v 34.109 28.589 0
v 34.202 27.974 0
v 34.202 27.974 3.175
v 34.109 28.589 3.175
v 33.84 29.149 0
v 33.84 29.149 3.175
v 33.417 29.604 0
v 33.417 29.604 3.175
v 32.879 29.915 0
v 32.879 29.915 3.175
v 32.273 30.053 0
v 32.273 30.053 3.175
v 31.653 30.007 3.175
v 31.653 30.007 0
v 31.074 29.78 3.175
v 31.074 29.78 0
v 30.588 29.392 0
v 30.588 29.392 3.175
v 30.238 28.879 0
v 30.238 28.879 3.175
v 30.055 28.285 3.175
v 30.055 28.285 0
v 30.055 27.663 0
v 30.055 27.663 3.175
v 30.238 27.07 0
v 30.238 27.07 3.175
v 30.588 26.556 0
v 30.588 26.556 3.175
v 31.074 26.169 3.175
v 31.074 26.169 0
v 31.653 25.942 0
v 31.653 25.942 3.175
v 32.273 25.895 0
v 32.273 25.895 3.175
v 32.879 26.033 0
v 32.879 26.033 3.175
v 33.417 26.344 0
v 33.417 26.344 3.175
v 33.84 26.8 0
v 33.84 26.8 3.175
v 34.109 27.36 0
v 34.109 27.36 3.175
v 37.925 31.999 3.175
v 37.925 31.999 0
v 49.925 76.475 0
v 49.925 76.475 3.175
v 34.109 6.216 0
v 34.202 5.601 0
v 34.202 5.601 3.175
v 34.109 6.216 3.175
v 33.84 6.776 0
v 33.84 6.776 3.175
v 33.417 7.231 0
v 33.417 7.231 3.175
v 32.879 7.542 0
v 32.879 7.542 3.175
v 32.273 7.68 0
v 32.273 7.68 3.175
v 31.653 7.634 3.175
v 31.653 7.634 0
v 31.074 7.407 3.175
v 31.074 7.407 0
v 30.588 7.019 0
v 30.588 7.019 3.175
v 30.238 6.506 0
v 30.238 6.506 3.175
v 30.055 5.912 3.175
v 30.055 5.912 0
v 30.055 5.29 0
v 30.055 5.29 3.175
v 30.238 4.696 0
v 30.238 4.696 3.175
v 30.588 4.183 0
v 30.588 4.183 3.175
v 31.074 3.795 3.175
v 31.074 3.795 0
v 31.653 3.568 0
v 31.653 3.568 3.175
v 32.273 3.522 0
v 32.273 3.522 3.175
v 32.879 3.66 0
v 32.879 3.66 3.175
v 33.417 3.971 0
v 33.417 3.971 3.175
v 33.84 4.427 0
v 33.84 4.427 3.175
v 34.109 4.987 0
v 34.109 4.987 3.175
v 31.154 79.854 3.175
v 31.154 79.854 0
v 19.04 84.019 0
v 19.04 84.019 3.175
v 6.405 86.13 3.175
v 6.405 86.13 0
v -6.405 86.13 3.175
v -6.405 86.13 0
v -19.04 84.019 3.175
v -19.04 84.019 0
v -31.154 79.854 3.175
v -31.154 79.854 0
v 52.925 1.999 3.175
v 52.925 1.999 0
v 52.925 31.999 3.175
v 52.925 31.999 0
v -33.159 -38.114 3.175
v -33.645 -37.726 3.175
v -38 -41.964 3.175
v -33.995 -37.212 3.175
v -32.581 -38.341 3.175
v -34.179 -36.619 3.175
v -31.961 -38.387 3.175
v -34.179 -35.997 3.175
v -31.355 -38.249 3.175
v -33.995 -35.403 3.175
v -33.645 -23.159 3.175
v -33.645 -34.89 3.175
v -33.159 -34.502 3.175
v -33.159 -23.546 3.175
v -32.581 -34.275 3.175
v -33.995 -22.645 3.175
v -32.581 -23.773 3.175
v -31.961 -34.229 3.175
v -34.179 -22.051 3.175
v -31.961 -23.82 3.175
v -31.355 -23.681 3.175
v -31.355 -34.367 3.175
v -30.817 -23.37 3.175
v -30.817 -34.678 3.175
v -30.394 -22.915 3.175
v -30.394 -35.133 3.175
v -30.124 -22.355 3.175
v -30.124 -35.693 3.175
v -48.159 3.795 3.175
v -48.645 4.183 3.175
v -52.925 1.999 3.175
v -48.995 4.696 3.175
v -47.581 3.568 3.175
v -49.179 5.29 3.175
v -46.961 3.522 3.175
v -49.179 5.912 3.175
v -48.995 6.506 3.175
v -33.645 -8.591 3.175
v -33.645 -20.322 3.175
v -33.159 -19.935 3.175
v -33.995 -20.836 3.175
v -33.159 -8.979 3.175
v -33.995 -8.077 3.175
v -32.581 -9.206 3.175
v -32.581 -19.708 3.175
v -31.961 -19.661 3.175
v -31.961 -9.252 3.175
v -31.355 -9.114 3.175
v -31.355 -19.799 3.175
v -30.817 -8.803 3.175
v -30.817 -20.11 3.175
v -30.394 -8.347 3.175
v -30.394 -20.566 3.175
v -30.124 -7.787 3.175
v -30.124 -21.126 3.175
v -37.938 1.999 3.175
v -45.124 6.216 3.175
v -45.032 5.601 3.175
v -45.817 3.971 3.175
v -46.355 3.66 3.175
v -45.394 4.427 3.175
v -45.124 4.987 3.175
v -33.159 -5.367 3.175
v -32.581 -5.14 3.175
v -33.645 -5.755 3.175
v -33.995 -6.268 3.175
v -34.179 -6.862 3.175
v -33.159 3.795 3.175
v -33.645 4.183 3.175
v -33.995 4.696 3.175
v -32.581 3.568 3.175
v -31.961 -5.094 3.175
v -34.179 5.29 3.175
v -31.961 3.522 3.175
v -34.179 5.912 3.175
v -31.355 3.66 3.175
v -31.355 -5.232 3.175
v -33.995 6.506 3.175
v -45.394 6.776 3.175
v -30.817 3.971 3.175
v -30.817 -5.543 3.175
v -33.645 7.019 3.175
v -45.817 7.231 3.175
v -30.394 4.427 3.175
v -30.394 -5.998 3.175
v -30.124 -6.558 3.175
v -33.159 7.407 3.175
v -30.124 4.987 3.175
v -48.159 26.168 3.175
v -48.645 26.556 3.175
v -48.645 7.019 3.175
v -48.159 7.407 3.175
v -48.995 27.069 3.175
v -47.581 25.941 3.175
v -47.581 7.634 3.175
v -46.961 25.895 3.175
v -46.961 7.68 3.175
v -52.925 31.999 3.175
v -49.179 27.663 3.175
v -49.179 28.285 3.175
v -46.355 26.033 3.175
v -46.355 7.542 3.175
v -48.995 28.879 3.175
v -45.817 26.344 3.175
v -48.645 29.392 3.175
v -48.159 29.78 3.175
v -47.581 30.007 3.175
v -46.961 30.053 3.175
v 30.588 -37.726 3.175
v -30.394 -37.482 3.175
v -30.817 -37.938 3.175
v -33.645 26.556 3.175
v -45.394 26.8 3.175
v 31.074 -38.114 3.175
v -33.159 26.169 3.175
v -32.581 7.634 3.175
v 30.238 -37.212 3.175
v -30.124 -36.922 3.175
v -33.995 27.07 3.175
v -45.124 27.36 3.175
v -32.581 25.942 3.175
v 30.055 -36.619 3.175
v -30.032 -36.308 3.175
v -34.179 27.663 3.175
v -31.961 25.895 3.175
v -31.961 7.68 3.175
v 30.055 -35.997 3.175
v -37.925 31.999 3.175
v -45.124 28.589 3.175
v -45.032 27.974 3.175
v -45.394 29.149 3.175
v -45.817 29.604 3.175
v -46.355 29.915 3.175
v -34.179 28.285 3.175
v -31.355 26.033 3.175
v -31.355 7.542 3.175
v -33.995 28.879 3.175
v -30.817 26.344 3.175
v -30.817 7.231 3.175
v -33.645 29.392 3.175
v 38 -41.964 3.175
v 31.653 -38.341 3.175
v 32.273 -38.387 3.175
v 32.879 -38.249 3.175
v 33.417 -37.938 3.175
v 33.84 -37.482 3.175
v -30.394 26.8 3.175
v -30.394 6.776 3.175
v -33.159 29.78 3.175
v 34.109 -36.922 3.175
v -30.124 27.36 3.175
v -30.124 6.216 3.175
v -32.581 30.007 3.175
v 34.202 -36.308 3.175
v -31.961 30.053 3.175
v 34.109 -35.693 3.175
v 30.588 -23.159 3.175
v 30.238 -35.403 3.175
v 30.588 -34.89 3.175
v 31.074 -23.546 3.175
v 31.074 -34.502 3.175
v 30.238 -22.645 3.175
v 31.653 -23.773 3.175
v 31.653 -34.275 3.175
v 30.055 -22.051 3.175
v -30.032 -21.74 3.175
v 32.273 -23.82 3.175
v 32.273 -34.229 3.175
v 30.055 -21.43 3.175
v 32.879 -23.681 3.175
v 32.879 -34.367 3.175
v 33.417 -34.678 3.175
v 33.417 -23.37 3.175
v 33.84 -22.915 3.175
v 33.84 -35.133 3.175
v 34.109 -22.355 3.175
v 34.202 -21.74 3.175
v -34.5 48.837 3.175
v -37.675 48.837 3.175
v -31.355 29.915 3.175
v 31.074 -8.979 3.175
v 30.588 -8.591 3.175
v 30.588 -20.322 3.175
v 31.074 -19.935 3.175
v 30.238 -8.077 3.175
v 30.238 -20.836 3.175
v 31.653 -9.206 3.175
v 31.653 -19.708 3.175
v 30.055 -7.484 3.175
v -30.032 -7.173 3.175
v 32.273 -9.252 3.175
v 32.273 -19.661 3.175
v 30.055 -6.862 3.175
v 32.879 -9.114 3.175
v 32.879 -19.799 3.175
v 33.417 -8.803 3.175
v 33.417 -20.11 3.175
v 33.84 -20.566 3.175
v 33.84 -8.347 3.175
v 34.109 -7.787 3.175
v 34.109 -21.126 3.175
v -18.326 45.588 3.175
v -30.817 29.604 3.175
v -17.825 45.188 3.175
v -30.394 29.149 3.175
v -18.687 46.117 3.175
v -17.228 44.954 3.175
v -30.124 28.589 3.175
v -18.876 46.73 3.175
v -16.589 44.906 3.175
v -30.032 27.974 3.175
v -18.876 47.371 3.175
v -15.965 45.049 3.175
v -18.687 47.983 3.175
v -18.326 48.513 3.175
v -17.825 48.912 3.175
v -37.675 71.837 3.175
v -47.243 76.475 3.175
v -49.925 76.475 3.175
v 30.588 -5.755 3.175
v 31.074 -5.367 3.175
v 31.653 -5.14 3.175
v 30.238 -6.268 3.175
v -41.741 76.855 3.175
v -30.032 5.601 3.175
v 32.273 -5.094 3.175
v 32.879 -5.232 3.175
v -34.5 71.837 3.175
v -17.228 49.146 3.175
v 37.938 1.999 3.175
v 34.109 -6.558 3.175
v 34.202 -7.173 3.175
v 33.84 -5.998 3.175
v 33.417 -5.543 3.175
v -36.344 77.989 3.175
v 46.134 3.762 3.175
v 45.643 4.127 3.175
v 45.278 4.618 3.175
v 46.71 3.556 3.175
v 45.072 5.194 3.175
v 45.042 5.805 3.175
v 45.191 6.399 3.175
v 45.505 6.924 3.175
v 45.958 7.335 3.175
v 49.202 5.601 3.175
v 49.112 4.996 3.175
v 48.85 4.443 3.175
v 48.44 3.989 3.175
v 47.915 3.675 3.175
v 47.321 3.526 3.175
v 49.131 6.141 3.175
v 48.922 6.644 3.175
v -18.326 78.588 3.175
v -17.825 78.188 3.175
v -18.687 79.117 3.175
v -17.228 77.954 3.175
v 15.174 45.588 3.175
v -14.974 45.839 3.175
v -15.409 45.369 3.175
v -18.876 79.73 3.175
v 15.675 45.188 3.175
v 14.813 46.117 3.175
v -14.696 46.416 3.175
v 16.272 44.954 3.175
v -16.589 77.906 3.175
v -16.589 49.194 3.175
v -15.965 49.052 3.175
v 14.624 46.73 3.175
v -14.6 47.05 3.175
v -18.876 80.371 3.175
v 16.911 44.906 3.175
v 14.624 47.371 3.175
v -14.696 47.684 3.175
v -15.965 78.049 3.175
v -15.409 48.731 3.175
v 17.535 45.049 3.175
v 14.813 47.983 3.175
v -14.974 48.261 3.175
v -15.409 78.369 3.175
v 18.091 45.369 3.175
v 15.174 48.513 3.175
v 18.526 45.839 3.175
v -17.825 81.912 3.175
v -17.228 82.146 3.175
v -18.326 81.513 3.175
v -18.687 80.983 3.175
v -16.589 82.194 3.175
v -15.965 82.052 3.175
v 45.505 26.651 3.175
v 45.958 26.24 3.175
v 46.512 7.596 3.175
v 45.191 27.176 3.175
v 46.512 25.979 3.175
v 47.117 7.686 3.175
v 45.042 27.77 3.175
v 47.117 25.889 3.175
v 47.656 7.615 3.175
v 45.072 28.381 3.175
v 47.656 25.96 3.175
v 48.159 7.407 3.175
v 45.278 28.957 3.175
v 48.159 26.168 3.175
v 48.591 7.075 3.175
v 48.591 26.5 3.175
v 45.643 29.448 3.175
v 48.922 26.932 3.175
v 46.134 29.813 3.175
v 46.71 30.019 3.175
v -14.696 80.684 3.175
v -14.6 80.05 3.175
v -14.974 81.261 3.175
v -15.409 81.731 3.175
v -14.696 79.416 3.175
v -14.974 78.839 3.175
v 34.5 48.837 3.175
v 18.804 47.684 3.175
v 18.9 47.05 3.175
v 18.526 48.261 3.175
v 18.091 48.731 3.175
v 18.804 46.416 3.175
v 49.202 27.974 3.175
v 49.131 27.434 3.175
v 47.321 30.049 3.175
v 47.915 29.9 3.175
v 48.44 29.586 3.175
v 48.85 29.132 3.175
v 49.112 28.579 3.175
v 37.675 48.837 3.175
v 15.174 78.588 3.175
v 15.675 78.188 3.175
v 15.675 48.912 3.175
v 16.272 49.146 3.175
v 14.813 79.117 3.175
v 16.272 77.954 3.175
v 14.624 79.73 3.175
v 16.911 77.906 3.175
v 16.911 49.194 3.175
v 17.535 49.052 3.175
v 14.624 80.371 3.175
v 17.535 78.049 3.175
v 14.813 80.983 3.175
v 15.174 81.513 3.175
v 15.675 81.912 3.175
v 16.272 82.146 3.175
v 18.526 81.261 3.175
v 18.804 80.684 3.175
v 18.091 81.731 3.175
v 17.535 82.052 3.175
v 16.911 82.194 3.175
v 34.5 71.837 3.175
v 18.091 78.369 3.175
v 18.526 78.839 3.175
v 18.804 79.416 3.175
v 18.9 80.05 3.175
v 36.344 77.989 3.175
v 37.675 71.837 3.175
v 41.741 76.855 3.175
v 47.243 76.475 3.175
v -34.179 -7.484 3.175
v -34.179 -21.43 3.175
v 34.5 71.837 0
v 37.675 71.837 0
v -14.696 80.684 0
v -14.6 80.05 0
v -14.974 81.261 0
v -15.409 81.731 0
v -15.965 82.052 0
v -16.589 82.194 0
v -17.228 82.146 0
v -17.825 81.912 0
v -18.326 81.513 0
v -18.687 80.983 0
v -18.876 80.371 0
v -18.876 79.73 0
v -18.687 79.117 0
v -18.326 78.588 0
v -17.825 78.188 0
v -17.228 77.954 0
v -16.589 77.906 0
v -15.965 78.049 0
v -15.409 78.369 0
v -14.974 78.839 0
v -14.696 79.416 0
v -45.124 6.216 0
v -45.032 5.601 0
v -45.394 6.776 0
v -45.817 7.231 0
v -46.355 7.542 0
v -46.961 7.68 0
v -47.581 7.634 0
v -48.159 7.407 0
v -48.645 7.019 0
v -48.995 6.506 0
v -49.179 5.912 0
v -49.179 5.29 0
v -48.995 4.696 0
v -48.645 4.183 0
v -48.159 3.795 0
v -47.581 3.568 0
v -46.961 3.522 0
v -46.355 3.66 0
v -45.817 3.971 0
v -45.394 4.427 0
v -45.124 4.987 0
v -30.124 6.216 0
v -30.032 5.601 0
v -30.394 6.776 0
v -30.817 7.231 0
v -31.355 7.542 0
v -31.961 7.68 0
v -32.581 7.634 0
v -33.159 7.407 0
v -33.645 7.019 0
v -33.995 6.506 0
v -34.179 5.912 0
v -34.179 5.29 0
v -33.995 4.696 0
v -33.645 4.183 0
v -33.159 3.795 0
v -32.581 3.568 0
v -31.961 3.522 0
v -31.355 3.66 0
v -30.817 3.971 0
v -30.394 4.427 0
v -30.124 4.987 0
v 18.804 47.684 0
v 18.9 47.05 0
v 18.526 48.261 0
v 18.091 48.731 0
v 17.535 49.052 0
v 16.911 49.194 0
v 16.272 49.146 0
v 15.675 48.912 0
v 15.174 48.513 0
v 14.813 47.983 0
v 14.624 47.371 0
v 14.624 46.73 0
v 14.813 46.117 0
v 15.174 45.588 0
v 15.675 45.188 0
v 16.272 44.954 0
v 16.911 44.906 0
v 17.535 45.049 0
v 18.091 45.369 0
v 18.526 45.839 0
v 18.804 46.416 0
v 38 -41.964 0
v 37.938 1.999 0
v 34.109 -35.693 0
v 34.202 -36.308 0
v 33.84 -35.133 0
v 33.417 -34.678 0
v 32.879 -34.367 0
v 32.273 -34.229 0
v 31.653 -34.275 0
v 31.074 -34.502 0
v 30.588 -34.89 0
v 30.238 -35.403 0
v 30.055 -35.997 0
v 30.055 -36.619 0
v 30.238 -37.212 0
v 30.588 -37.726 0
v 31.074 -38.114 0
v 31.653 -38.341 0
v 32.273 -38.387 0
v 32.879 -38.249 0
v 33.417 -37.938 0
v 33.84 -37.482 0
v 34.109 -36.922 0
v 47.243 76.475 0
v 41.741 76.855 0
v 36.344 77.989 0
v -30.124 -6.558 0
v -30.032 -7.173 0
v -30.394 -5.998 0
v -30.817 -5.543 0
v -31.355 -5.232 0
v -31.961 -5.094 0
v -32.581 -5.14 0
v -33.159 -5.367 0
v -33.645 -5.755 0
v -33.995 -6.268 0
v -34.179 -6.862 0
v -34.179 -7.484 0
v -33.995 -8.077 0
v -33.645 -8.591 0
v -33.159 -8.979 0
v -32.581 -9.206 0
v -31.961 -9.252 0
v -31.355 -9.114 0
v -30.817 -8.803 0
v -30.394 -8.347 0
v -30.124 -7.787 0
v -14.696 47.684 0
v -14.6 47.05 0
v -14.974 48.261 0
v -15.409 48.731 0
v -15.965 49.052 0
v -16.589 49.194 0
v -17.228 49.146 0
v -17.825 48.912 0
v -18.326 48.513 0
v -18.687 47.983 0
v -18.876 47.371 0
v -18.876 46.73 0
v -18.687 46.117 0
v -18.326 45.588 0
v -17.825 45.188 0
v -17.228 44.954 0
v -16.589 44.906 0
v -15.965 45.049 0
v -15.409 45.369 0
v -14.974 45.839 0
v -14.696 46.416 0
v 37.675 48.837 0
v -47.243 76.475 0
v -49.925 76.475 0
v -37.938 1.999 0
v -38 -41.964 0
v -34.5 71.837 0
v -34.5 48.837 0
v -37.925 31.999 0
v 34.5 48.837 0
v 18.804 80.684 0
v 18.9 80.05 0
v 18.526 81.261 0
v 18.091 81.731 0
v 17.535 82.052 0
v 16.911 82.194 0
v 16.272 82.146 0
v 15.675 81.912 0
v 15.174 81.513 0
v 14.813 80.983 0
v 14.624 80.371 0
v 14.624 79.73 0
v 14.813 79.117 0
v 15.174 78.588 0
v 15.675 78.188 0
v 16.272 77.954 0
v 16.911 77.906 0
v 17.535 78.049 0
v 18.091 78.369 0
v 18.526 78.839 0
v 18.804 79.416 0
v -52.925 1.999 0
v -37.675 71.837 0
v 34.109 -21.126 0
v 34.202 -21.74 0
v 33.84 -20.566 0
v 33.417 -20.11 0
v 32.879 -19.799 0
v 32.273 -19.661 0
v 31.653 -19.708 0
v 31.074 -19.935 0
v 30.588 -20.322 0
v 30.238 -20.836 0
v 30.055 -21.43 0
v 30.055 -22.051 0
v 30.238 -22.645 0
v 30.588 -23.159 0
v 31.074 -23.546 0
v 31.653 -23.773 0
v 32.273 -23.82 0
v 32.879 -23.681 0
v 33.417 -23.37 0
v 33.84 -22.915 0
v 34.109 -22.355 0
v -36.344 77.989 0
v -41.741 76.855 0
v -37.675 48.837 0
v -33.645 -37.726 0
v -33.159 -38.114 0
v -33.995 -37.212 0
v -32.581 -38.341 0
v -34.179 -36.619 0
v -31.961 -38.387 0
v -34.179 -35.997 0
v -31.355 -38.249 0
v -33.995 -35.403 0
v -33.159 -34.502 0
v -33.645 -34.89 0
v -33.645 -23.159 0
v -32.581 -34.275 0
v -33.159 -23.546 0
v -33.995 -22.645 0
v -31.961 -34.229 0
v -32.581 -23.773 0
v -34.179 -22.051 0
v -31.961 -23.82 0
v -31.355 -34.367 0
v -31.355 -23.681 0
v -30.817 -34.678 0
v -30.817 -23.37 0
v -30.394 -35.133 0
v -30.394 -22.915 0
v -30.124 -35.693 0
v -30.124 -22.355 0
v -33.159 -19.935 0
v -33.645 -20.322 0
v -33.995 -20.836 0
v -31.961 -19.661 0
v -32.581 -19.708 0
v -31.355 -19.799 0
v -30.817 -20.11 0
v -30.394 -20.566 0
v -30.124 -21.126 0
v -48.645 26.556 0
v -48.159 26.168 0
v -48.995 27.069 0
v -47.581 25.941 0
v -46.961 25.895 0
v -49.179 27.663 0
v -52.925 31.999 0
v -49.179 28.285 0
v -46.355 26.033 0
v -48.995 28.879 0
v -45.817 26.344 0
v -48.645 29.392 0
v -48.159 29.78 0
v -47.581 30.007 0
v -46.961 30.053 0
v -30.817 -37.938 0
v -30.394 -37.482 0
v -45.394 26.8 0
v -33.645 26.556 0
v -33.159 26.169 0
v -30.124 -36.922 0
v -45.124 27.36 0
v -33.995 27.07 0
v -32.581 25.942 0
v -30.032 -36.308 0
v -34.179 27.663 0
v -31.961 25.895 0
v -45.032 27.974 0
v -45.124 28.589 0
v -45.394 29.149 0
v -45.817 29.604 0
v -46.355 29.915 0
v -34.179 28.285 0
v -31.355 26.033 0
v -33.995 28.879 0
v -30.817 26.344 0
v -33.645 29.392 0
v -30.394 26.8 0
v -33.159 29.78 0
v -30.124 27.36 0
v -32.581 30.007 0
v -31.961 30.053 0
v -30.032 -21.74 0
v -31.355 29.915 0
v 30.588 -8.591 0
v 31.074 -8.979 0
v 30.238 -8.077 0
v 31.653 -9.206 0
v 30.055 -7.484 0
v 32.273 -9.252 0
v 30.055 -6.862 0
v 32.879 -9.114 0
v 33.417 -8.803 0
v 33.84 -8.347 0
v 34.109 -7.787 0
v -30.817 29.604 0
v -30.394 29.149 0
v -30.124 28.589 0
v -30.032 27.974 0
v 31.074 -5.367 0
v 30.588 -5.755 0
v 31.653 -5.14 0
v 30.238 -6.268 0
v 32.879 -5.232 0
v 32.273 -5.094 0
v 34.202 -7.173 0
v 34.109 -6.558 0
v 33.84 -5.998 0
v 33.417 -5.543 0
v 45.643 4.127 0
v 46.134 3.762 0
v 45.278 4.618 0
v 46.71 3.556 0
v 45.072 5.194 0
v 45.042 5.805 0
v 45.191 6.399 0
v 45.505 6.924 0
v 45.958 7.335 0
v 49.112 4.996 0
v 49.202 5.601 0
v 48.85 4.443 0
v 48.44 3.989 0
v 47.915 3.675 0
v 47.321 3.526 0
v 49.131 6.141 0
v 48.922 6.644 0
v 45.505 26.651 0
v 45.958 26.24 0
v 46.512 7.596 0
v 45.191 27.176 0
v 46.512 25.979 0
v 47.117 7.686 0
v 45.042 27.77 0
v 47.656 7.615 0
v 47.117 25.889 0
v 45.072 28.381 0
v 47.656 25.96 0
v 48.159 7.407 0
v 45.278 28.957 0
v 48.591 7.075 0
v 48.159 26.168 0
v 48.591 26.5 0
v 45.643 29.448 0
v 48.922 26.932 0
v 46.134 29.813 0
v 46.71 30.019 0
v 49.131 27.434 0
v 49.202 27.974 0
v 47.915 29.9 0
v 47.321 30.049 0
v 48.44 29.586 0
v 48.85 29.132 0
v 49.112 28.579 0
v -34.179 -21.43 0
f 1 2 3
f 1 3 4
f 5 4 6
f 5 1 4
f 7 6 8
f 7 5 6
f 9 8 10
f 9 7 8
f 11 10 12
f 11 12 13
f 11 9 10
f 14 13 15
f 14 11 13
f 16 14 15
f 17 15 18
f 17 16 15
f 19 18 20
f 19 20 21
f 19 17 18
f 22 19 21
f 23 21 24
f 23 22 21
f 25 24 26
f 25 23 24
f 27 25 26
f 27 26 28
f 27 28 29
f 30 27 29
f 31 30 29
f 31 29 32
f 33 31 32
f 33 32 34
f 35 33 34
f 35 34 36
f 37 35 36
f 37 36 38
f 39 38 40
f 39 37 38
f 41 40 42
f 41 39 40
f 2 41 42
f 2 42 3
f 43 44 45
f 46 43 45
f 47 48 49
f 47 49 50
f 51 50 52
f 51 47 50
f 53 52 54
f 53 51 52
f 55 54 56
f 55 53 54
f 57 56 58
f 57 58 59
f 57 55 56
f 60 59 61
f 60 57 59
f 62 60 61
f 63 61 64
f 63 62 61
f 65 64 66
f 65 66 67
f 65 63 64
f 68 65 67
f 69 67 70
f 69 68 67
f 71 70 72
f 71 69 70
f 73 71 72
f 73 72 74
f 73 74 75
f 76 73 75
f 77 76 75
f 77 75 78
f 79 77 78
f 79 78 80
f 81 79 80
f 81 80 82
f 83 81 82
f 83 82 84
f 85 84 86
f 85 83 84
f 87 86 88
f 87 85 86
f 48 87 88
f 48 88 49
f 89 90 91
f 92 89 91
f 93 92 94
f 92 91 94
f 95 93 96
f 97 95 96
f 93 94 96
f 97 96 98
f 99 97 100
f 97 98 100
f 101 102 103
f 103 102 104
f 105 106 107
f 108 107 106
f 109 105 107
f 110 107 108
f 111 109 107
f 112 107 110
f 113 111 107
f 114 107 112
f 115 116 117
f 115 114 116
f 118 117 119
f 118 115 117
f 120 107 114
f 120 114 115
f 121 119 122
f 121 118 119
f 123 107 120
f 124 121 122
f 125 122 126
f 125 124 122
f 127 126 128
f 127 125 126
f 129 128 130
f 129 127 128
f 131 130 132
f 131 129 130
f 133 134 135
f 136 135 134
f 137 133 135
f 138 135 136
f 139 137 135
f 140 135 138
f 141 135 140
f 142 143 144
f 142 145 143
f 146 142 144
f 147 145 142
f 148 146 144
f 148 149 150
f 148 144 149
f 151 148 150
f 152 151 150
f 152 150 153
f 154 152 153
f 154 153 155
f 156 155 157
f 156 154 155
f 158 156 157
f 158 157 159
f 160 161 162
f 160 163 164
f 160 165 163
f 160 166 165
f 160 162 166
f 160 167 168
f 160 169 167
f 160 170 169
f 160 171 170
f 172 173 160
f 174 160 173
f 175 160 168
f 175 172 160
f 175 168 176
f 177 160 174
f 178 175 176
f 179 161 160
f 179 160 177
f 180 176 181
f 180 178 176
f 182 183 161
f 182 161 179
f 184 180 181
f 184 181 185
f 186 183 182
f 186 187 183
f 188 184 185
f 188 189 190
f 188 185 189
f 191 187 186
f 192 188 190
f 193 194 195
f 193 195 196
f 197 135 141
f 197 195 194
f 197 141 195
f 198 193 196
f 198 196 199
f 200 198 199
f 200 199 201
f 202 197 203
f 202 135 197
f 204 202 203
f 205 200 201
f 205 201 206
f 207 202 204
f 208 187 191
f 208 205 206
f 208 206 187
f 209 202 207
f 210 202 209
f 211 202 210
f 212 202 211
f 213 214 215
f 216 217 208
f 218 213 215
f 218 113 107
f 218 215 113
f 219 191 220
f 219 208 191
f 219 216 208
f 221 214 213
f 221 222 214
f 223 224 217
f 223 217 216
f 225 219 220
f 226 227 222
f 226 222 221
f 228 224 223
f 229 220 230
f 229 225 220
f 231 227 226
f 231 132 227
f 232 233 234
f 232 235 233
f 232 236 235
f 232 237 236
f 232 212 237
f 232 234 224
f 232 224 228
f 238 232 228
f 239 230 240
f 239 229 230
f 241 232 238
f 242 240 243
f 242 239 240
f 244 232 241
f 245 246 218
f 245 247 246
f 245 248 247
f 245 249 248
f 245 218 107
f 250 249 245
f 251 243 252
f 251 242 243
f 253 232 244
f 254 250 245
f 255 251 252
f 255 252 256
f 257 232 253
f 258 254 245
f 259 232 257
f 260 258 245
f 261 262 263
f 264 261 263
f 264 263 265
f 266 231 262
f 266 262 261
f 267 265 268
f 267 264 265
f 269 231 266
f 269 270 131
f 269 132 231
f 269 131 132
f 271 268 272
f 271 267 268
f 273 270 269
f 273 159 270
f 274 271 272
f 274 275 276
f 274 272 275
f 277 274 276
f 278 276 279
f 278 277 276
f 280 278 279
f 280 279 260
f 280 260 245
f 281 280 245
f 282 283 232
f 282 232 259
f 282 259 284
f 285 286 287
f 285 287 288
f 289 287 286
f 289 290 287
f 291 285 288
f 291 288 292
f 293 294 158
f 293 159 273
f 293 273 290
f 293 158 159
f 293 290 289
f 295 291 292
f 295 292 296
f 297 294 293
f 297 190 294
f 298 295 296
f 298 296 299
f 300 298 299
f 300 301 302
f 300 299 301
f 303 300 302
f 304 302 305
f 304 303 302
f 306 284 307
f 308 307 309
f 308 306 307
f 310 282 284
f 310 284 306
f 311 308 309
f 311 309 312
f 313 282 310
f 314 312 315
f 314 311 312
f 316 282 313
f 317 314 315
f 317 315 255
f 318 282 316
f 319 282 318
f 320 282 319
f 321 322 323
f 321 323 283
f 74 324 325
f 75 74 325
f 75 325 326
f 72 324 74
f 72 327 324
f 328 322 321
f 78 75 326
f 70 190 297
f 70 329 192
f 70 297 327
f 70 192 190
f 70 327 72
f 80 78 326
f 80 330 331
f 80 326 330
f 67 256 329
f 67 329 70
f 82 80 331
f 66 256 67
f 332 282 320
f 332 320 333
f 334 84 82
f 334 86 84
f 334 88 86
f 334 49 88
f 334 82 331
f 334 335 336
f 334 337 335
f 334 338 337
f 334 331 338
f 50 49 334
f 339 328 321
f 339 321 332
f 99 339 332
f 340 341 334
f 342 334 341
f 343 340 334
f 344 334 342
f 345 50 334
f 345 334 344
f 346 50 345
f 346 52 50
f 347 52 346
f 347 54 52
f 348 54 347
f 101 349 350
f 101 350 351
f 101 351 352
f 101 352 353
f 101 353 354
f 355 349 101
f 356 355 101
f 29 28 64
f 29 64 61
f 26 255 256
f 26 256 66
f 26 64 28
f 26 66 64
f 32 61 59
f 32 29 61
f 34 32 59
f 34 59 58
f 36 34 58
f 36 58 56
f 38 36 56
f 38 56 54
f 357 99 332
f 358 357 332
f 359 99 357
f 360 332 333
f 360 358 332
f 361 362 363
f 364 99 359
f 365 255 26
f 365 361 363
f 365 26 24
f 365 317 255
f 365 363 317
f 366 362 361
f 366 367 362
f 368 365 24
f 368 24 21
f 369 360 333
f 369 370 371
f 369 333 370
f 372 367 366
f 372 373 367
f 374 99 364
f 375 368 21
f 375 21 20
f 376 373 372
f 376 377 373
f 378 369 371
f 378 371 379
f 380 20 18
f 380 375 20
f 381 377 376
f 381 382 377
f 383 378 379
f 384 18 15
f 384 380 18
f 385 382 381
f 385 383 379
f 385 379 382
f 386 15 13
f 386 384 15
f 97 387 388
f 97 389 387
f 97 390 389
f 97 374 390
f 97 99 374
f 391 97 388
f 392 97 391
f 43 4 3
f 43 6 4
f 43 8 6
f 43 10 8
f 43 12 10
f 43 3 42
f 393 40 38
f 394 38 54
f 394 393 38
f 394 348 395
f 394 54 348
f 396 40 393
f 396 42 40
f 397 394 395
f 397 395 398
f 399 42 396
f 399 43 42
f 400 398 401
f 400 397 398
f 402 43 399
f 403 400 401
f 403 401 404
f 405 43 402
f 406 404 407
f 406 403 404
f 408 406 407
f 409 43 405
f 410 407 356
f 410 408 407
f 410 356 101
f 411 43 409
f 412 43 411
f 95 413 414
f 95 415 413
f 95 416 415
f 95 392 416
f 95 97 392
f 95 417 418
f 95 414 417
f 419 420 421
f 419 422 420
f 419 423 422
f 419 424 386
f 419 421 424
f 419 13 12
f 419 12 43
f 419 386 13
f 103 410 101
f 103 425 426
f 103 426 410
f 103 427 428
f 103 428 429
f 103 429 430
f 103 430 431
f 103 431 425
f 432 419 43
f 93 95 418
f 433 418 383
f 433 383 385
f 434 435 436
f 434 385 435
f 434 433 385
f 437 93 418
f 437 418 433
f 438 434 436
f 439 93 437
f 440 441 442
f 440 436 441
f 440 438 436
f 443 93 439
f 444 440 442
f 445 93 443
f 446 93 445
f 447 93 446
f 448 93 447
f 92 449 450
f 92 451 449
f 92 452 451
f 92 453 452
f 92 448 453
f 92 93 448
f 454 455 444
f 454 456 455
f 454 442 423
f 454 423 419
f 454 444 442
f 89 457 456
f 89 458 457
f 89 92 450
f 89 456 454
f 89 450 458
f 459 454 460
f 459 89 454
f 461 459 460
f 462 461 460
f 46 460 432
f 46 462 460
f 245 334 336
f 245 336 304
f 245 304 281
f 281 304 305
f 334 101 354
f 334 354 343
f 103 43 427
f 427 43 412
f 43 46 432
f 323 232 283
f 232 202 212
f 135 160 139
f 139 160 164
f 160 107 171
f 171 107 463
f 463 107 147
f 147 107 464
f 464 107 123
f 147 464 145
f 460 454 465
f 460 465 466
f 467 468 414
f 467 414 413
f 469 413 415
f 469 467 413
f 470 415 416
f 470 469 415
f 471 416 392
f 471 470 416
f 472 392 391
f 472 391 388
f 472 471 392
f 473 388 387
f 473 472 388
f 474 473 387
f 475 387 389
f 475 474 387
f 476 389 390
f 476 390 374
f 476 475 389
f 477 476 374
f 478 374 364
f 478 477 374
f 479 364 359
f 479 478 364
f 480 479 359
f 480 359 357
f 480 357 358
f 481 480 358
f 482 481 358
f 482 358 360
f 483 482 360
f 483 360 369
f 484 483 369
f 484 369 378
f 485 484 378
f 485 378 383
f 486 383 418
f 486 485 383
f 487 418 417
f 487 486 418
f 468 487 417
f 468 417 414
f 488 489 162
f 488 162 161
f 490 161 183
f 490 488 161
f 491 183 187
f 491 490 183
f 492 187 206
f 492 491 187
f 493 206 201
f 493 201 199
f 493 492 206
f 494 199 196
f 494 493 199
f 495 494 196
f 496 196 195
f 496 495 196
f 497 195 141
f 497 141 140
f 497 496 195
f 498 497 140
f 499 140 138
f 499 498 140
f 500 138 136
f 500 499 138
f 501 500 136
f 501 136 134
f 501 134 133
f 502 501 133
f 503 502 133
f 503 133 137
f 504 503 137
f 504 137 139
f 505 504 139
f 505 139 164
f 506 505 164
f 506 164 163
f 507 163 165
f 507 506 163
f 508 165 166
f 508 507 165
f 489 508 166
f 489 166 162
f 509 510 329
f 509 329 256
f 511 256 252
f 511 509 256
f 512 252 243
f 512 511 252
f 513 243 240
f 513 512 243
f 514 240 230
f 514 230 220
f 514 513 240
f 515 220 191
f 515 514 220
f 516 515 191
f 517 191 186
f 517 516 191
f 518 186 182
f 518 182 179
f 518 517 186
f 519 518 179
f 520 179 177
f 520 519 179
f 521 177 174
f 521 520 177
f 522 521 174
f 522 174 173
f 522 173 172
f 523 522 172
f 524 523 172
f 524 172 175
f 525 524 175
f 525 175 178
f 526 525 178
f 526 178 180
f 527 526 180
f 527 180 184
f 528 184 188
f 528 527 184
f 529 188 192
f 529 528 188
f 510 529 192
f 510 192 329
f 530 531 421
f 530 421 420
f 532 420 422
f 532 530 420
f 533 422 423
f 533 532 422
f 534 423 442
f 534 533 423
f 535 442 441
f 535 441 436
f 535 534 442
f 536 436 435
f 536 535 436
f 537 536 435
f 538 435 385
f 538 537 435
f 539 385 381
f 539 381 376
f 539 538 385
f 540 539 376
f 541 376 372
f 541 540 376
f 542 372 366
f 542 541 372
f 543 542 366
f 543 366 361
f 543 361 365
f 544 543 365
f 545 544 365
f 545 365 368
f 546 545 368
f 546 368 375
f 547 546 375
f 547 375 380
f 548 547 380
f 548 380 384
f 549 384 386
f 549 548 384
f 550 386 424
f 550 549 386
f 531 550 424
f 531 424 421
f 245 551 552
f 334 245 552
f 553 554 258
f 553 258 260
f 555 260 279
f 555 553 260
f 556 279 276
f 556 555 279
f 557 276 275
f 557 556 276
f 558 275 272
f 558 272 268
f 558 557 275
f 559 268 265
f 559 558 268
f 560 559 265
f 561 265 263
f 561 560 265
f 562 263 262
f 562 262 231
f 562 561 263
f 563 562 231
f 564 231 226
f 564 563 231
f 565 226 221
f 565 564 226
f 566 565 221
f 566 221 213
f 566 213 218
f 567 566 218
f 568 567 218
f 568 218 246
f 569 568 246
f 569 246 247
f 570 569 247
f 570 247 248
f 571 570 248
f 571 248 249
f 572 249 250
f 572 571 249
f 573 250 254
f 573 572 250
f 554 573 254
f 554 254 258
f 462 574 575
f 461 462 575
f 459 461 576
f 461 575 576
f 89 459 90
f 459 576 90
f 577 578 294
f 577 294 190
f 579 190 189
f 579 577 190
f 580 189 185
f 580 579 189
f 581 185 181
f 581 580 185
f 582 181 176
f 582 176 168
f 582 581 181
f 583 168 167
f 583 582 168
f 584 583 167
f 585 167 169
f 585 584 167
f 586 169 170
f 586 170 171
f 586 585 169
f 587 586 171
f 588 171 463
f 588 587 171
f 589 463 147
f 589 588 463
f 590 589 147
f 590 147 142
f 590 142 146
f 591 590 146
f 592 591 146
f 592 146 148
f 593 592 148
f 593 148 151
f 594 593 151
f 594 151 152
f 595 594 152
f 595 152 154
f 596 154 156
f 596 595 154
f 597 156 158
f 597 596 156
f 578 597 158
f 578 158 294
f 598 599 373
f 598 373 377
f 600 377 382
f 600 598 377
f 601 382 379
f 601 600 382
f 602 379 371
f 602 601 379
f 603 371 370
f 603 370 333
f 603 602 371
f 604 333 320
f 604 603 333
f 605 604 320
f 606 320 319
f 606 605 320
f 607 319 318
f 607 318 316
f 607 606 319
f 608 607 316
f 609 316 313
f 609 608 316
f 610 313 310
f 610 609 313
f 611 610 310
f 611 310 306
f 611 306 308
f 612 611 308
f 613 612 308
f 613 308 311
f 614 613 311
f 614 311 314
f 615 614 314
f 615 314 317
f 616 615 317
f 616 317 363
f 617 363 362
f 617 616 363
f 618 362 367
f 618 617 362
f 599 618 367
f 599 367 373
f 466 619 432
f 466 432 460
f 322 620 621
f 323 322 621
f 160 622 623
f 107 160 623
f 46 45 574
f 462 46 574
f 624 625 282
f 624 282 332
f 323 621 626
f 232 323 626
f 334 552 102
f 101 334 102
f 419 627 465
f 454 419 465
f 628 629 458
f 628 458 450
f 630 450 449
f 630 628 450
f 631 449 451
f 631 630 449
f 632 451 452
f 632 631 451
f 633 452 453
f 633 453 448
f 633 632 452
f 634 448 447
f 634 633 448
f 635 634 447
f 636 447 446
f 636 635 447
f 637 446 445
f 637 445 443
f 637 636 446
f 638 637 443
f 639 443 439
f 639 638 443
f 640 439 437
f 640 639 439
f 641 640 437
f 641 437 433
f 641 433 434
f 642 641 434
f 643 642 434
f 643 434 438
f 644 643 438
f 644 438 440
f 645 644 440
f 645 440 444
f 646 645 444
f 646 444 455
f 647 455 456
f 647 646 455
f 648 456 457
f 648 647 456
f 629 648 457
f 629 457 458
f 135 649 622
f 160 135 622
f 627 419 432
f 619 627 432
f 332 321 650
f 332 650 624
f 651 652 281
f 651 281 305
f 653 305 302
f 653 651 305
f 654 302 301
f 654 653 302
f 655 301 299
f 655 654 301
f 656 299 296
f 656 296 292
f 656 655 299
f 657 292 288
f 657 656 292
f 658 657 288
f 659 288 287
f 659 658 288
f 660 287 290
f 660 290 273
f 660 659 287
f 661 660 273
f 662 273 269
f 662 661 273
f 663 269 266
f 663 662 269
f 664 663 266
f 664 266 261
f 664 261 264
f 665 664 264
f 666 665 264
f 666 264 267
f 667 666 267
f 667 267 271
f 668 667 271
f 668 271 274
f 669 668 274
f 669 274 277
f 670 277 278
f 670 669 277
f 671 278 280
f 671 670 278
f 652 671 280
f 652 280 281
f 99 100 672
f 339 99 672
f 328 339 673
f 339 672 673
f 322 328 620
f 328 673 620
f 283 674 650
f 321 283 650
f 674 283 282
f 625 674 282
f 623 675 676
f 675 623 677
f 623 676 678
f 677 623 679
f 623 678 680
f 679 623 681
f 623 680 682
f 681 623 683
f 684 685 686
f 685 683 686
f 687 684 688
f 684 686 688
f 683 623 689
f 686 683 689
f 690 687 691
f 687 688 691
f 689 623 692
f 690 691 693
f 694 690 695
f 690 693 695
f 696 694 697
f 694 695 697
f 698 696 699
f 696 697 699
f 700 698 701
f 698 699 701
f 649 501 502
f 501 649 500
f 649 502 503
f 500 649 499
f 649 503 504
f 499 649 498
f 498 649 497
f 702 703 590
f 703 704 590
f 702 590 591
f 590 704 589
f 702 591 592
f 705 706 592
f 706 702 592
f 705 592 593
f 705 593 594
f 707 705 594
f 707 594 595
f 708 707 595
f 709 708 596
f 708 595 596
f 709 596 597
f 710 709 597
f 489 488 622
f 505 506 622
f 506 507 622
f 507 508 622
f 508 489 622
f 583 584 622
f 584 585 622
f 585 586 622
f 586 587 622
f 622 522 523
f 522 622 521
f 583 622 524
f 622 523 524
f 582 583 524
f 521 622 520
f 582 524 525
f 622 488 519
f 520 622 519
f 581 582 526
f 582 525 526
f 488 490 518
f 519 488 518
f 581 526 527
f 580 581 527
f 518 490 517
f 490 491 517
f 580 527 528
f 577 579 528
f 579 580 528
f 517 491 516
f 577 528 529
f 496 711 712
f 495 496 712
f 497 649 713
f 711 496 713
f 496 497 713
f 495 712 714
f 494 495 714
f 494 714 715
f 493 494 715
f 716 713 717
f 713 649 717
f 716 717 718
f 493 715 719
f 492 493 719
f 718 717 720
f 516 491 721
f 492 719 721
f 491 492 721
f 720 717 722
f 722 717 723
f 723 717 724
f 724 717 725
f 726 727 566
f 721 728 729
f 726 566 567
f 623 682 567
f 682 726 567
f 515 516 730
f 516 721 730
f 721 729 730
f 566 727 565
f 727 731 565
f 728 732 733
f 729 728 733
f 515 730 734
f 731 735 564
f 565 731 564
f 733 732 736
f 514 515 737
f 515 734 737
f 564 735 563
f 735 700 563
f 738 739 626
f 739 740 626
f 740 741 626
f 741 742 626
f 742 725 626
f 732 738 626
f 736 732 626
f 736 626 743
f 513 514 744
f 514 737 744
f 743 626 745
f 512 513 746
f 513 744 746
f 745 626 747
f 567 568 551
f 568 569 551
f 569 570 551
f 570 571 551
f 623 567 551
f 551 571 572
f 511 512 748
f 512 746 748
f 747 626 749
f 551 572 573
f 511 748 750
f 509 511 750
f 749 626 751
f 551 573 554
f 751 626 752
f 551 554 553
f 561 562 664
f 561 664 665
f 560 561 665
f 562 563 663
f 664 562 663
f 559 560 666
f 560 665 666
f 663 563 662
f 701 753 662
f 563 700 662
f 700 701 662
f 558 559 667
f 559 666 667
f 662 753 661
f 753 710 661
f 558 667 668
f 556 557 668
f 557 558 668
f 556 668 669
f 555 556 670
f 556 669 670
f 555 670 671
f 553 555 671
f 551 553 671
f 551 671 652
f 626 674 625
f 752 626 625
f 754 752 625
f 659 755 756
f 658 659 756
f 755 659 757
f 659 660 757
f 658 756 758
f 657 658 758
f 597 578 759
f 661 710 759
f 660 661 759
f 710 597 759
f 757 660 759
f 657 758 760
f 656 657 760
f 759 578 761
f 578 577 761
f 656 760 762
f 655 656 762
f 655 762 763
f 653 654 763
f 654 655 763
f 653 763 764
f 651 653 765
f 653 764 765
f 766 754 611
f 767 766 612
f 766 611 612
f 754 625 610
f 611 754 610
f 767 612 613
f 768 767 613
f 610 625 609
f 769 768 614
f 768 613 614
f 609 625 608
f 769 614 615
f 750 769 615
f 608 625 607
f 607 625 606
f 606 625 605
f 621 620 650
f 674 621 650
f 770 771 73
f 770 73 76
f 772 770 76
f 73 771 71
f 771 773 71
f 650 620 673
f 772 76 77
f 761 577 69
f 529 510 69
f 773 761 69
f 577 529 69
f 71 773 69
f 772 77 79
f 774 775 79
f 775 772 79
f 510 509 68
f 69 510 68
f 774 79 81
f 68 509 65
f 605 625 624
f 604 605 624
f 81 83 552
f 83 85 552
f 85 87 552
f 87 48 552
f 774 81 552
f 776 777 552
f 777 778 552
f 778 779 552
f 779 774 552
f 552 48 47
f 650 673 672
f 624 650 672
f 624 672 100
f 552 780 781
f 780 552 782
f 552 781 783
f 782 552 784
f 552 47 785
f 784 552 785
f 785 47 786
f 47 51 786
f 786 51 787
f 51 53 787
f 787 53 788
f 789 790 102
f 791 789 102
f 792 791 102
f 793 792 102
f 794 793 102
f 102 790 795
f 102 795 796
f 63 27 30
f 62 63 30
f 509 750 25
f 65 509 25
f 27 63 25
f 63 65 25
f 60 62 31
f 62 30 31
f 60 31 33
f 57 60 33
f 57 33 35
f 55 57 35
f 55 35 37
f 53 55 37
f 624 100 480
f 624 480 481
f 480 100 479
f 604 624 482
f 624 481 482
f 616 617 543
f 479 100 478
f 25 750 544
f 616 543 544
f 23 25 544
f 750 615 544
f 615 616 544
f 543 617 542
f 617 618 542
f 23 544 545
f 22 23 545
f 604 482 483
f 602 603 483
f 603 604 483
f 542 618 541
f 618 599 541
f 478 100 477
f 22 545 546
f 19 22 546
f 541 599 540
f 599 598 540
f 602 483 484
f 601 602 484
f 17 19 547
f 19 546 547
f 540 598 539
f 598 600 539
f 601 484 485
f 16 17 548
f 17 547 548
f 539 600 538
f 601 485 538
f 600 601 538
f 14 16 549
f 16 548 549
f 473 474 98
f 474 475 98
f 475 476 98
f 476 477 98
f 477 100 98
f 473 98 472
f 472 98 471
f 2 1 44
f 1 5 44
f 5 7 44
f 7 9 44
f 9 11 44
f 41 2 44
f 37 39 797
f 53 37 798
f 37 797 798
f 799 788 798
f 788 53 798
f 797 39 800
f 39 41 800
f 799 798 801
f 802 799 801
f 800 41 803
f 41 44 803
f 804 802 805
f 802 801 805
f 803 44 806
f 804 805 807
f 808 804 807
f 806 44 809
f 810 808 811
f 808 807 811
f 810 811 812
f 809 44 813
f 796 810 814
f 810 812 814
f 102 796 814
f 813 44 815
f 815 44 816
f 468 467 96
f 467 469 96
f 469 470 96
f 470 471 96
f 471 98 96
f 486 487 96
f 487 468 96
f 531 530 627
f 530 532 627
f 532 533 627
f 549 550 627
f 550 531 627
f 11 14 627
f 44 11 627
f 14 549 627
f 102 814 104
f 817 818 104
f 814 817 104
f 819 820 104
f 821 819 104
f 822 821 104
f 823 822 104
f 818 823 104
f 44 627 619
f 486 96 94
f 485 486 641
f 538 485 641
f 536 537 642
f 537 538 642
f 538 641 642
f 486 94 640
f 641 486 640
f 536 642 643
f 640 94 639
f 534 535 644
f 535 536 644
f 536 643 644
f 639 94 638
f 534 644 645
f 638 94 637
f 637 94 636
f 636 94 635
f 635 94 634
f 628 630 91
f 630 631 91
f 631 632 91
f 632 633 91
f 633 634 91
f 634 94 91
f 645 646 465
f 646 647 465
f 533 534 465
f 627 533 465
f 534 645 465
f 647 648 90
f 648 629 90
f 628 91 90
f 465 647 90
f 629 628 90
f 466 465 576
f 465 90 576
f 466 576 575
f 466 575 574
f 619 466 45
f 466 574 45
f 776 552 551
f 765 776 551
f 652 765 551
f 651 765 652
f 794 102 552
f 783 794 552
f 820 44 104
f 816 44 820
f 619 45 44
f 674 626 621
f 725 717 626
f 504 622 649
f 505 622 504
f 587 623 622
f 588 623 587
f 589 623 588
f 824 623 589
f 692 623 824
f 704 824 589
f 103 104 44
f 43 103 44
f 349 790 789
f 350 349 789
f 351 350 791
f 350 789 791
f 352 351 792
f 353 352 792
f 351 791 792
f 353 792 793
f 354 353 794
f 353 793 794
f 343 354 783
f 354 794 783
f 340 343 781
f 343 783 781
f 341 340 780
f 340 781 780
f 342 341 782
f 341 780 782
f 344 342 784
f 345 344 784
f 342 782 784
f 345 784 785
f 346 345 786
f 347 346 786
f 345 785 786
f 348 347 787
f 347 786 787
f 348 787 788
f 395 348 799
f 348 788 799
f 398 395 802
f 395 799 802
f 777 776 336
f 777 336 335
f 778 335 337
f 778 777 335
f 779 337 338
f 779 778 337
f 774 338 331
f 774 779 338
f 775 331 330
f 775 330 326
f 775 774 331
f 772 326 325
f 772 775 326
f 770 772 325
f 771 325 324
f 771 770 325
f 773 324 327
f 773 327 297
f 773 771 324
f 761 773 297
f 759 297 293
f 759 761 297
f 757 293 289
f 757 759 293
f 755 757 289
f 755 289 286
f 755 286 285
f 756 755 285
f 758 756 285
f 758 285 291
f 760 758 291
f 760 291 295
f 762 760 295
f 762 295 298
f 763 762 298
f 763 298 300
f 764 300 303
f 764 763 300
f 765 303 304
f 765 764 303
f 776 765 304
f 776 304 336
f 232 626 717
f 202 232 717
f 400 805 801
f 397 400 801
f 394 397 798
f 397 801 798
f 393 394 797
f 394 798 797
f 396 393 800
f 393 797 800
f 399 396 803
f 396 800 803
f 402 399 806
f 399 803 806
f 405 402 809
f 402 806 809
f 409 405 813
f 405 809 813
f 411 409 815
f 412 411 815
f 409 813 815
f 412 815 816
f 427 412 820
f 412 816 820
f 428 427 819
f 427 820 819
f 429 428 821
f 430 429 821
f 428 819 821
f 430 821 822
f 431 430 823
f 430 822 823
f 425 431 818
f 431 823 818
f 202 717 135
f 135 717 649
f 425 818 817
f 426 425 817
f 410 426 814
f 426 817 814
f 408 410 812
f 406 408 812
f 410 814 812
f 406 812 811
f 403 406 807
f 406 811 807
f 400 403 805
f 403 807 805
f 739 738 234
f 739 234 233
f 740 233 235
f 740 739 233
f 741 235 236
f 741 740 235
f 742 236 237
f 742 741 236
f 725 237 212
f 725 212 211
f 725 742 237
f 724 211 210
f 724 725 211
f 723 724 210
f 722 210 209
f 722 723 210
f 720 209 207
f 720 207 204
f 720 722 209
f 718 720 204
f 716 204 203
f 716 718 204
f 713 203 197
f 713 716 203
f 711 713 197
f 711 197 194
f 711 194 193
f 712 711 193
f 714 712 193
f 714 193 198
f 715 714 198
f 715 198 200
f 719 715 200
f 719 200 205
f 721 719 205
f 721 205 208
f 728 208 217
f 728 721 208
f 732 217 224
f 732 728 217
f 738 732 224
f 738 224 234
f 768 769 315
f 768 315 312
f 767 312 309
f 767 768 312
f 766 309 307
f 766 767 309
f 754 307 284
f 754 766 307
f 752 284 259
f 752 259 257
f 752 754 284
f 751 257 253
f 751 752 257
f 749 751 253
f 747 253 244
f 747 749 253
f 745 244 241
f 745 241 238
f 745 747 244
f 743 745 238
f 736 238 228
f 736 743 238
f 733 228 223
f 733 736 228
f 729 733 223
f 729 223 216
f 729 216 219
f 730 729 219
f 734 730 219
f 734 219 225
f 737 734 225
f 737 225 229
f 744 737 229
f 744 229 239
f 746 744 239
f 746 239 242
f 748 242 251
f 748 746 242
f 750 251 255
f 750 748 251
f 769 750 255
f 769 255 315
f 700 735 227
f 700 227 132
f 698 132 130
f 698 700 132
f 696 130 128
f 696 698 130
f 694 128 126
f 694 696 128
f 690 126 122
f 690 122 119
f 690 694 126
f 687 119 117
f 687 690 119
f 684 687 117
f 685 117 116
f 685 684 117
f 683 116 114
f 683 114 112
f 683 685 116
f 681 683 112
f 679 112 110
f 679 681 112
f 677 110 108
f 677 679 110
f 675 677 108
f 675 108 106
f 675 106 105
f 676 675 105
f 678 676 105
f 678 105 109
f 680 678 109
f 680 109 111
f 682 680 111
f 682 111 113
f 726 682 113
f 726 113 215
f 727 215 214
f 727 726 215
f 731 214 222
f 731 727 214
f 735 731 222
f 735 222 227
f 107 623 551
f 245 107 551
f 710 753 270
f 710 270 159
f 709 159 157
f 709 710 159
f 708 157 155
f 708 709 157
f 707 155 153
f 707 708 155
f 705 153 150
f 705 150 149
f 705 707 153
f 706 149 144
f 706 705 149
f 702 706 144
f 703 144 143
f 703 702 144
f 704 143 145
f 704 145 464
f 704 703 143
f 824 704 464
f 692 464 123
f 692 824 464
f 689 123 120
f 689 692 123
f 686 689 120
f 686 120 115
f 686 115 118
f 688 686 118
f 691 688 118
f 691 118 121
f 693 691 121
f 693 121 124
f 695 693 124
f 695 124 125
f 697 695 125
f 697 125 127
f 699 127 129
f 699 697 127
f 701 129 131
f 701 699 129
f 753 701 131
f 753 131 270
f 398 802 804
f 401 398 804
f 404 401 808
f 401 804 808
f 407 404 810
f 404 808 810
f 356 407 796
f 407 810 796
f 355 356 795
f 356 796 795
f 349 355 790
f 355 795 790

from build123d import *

# Parameters (mm, degrees)
F0_R     = 2.085
F0_R_2   = 2.15
F0_W     = 3.175
F0_H     = 23
F1_DEPTH = 3.175


with BuildPart() as f1:
    # F0 (on Top) → F1 (new body)
    with BuildSketch(Plane.XY):
        with BuildLine():
            Line((-38, -41.9637251374), (0, -41.9637251374))
            Line((0, -41.9637251374), (38, -41.9637251374))
            Line((38, -41.9637251374), (37.9384113545, 1.9986380357))
            Line((37.9384113545, 1.9986380357), (52.9251351953, 1.9986380357))
            Line((52.9251351953, 1.9986380357), (52.9251351953, 31.9986380357))
            Line((52.9251351953, 31.9986380357), (37.9251351953, 31.9986380357))
            Line((37.9251351953, 31.9986380357), (49.9251351953, 76.4752441225))
            Line((49.9251351953, 76.4752441225), (47.2431264601, 76.4752441225))
            ThreePointArc((47.2431264601, 76.4752441225), (39.0233041791, 77.3289221795), (31.1543359938, 79.8535180391))
            ThreePointArc((31.1543359938, 79.8535180391), (0, 86.3952080993), (-31.1543359938, 79.8535180391))
            ThreePointArc((-31.1543359938, 79.8535180391), (-39.0233041791, 77.3289221795), (-47.2431264601, 76.4752441225))
            Line((-47.2431264601, 76.4752441225), (-49.9251351953, 76.4752441225))
            Line((-49.9251351953, 76.4752441225), (-37.9251351953, 31.9986380357))
            Line((-37.9251351953, 31.9986380357), (-52.9251351953, 31.9986380357))
            Line((-52.9251351953, 31.9986380357), (-52.9251351953, 1.9986380357))
            Line((-52.9251351953, 1.9986380357), (-37.9384113545, 1.9986380357))
            Line((-37.9384113545, 1.9986380357), (-38, -41.9637251374))
        make_face()
        with Locations((-32.1168240318, -36.3078415394)):
            Circle(F0_R, mode=Mode.SUBTRACT)
        with Locations((-32.1168240318, -21.7403415394)):
            Circle(F0_R, mode=Mode.SUBTRACT)
        with Locations((-47.1168240318, 5.6010650516)):
            Circle(F0_R, mode=Mode.SUBTRACT)
        with Locations((-32.1168240318, -7.1728415394)):
            Circle(F0_R, mode=Mode.SUBTRACT)
        with Locations((-32.1168240318, 5.6010650516)):
            Circle(F0_R, mode=Mode.SUBTRACT)
        with Locations((32.1168240318, -36.3078415394)):
            Circle(F0_R, mode=Mode.SUBTRACT)
        with Locations((32.1168240318, -21.7403415394)):
            Circle(F0_R, mode=Mode.SUBTRACT)
        with Locations((32.1168240318, -7.1728415394)):
            Circle(F0_R, mode=Mode.SUBTRACT)
        with Locations((32.1168240318, 5.6010650516)):
            Circle(F0_R, mode=Mode.SUBTRACT)
        with BuildLine():
            ThreePointArc((49.2018240318, 5.6010650516), (45.6425063931, 4.1267474129), (47.1168240318, 7.6860650516))
            ThreePointArc((47.1168240318, 7.6860650516), (48.5911416706, 7.0753826904), (49.2018240318, 5.6010650516))
        make_face(mode=Mode.SUBTRACT)
        with Locations((-47.1168240318, 27.9740650516)):
            Circle(F0_R, mode=Mode.SUBTRACT)
        with Locations((-32.1168240318, 27.9742324866)):
            Circle(F0_R, mode=Mode.SUBTRACT)
        with Locations((-16.75, 47.0501706004)):
            Circle(F0_R_2, mode=Mode.SUBTRACT)
        with Locations((-36.0875, 60.3372221589)):
            Rectangle(F0_W, F0_H, mode=Mode.SUBTRACT)
        with Locations((-16.75, 80.0501706004)):
            Circle(F0_R_2, mode=Mode.SUBTRACT)
        with Locations((16.75, 47.0501706004)):
            Circle(F0_R_2, mode=Mode.SUBTRACT)
        with Locations((32.1168240318, 27.9742324866)):
            Circle(F0_R, mode=Mode.SUBTRACT)
        with BuildLine():
            ThreePointArc((47.1168240318, 25.8890650516), (45.6425063931, 29.4483826904), (49.2018240318, 27.9740650516))
            ThreePointArc((49.2018240318, 27.9740650516), (48.5911416706, 26.4997474129), (47.1168240318, 25.8890650516))
        make_face(mode=Mode.SUBTRACT)
        with Locations((16.75, 80.0501706004)):
            Circle(F0_R_2, mode=Mode.SUBTRACT)
        with Locations((36.0875, 60.3372221589)):
            Rectangle(F0_W, F0_H, mode=Mode.SUBTRACT)
    extrude(amount=F1_DEPTH)


solid = f1.part
